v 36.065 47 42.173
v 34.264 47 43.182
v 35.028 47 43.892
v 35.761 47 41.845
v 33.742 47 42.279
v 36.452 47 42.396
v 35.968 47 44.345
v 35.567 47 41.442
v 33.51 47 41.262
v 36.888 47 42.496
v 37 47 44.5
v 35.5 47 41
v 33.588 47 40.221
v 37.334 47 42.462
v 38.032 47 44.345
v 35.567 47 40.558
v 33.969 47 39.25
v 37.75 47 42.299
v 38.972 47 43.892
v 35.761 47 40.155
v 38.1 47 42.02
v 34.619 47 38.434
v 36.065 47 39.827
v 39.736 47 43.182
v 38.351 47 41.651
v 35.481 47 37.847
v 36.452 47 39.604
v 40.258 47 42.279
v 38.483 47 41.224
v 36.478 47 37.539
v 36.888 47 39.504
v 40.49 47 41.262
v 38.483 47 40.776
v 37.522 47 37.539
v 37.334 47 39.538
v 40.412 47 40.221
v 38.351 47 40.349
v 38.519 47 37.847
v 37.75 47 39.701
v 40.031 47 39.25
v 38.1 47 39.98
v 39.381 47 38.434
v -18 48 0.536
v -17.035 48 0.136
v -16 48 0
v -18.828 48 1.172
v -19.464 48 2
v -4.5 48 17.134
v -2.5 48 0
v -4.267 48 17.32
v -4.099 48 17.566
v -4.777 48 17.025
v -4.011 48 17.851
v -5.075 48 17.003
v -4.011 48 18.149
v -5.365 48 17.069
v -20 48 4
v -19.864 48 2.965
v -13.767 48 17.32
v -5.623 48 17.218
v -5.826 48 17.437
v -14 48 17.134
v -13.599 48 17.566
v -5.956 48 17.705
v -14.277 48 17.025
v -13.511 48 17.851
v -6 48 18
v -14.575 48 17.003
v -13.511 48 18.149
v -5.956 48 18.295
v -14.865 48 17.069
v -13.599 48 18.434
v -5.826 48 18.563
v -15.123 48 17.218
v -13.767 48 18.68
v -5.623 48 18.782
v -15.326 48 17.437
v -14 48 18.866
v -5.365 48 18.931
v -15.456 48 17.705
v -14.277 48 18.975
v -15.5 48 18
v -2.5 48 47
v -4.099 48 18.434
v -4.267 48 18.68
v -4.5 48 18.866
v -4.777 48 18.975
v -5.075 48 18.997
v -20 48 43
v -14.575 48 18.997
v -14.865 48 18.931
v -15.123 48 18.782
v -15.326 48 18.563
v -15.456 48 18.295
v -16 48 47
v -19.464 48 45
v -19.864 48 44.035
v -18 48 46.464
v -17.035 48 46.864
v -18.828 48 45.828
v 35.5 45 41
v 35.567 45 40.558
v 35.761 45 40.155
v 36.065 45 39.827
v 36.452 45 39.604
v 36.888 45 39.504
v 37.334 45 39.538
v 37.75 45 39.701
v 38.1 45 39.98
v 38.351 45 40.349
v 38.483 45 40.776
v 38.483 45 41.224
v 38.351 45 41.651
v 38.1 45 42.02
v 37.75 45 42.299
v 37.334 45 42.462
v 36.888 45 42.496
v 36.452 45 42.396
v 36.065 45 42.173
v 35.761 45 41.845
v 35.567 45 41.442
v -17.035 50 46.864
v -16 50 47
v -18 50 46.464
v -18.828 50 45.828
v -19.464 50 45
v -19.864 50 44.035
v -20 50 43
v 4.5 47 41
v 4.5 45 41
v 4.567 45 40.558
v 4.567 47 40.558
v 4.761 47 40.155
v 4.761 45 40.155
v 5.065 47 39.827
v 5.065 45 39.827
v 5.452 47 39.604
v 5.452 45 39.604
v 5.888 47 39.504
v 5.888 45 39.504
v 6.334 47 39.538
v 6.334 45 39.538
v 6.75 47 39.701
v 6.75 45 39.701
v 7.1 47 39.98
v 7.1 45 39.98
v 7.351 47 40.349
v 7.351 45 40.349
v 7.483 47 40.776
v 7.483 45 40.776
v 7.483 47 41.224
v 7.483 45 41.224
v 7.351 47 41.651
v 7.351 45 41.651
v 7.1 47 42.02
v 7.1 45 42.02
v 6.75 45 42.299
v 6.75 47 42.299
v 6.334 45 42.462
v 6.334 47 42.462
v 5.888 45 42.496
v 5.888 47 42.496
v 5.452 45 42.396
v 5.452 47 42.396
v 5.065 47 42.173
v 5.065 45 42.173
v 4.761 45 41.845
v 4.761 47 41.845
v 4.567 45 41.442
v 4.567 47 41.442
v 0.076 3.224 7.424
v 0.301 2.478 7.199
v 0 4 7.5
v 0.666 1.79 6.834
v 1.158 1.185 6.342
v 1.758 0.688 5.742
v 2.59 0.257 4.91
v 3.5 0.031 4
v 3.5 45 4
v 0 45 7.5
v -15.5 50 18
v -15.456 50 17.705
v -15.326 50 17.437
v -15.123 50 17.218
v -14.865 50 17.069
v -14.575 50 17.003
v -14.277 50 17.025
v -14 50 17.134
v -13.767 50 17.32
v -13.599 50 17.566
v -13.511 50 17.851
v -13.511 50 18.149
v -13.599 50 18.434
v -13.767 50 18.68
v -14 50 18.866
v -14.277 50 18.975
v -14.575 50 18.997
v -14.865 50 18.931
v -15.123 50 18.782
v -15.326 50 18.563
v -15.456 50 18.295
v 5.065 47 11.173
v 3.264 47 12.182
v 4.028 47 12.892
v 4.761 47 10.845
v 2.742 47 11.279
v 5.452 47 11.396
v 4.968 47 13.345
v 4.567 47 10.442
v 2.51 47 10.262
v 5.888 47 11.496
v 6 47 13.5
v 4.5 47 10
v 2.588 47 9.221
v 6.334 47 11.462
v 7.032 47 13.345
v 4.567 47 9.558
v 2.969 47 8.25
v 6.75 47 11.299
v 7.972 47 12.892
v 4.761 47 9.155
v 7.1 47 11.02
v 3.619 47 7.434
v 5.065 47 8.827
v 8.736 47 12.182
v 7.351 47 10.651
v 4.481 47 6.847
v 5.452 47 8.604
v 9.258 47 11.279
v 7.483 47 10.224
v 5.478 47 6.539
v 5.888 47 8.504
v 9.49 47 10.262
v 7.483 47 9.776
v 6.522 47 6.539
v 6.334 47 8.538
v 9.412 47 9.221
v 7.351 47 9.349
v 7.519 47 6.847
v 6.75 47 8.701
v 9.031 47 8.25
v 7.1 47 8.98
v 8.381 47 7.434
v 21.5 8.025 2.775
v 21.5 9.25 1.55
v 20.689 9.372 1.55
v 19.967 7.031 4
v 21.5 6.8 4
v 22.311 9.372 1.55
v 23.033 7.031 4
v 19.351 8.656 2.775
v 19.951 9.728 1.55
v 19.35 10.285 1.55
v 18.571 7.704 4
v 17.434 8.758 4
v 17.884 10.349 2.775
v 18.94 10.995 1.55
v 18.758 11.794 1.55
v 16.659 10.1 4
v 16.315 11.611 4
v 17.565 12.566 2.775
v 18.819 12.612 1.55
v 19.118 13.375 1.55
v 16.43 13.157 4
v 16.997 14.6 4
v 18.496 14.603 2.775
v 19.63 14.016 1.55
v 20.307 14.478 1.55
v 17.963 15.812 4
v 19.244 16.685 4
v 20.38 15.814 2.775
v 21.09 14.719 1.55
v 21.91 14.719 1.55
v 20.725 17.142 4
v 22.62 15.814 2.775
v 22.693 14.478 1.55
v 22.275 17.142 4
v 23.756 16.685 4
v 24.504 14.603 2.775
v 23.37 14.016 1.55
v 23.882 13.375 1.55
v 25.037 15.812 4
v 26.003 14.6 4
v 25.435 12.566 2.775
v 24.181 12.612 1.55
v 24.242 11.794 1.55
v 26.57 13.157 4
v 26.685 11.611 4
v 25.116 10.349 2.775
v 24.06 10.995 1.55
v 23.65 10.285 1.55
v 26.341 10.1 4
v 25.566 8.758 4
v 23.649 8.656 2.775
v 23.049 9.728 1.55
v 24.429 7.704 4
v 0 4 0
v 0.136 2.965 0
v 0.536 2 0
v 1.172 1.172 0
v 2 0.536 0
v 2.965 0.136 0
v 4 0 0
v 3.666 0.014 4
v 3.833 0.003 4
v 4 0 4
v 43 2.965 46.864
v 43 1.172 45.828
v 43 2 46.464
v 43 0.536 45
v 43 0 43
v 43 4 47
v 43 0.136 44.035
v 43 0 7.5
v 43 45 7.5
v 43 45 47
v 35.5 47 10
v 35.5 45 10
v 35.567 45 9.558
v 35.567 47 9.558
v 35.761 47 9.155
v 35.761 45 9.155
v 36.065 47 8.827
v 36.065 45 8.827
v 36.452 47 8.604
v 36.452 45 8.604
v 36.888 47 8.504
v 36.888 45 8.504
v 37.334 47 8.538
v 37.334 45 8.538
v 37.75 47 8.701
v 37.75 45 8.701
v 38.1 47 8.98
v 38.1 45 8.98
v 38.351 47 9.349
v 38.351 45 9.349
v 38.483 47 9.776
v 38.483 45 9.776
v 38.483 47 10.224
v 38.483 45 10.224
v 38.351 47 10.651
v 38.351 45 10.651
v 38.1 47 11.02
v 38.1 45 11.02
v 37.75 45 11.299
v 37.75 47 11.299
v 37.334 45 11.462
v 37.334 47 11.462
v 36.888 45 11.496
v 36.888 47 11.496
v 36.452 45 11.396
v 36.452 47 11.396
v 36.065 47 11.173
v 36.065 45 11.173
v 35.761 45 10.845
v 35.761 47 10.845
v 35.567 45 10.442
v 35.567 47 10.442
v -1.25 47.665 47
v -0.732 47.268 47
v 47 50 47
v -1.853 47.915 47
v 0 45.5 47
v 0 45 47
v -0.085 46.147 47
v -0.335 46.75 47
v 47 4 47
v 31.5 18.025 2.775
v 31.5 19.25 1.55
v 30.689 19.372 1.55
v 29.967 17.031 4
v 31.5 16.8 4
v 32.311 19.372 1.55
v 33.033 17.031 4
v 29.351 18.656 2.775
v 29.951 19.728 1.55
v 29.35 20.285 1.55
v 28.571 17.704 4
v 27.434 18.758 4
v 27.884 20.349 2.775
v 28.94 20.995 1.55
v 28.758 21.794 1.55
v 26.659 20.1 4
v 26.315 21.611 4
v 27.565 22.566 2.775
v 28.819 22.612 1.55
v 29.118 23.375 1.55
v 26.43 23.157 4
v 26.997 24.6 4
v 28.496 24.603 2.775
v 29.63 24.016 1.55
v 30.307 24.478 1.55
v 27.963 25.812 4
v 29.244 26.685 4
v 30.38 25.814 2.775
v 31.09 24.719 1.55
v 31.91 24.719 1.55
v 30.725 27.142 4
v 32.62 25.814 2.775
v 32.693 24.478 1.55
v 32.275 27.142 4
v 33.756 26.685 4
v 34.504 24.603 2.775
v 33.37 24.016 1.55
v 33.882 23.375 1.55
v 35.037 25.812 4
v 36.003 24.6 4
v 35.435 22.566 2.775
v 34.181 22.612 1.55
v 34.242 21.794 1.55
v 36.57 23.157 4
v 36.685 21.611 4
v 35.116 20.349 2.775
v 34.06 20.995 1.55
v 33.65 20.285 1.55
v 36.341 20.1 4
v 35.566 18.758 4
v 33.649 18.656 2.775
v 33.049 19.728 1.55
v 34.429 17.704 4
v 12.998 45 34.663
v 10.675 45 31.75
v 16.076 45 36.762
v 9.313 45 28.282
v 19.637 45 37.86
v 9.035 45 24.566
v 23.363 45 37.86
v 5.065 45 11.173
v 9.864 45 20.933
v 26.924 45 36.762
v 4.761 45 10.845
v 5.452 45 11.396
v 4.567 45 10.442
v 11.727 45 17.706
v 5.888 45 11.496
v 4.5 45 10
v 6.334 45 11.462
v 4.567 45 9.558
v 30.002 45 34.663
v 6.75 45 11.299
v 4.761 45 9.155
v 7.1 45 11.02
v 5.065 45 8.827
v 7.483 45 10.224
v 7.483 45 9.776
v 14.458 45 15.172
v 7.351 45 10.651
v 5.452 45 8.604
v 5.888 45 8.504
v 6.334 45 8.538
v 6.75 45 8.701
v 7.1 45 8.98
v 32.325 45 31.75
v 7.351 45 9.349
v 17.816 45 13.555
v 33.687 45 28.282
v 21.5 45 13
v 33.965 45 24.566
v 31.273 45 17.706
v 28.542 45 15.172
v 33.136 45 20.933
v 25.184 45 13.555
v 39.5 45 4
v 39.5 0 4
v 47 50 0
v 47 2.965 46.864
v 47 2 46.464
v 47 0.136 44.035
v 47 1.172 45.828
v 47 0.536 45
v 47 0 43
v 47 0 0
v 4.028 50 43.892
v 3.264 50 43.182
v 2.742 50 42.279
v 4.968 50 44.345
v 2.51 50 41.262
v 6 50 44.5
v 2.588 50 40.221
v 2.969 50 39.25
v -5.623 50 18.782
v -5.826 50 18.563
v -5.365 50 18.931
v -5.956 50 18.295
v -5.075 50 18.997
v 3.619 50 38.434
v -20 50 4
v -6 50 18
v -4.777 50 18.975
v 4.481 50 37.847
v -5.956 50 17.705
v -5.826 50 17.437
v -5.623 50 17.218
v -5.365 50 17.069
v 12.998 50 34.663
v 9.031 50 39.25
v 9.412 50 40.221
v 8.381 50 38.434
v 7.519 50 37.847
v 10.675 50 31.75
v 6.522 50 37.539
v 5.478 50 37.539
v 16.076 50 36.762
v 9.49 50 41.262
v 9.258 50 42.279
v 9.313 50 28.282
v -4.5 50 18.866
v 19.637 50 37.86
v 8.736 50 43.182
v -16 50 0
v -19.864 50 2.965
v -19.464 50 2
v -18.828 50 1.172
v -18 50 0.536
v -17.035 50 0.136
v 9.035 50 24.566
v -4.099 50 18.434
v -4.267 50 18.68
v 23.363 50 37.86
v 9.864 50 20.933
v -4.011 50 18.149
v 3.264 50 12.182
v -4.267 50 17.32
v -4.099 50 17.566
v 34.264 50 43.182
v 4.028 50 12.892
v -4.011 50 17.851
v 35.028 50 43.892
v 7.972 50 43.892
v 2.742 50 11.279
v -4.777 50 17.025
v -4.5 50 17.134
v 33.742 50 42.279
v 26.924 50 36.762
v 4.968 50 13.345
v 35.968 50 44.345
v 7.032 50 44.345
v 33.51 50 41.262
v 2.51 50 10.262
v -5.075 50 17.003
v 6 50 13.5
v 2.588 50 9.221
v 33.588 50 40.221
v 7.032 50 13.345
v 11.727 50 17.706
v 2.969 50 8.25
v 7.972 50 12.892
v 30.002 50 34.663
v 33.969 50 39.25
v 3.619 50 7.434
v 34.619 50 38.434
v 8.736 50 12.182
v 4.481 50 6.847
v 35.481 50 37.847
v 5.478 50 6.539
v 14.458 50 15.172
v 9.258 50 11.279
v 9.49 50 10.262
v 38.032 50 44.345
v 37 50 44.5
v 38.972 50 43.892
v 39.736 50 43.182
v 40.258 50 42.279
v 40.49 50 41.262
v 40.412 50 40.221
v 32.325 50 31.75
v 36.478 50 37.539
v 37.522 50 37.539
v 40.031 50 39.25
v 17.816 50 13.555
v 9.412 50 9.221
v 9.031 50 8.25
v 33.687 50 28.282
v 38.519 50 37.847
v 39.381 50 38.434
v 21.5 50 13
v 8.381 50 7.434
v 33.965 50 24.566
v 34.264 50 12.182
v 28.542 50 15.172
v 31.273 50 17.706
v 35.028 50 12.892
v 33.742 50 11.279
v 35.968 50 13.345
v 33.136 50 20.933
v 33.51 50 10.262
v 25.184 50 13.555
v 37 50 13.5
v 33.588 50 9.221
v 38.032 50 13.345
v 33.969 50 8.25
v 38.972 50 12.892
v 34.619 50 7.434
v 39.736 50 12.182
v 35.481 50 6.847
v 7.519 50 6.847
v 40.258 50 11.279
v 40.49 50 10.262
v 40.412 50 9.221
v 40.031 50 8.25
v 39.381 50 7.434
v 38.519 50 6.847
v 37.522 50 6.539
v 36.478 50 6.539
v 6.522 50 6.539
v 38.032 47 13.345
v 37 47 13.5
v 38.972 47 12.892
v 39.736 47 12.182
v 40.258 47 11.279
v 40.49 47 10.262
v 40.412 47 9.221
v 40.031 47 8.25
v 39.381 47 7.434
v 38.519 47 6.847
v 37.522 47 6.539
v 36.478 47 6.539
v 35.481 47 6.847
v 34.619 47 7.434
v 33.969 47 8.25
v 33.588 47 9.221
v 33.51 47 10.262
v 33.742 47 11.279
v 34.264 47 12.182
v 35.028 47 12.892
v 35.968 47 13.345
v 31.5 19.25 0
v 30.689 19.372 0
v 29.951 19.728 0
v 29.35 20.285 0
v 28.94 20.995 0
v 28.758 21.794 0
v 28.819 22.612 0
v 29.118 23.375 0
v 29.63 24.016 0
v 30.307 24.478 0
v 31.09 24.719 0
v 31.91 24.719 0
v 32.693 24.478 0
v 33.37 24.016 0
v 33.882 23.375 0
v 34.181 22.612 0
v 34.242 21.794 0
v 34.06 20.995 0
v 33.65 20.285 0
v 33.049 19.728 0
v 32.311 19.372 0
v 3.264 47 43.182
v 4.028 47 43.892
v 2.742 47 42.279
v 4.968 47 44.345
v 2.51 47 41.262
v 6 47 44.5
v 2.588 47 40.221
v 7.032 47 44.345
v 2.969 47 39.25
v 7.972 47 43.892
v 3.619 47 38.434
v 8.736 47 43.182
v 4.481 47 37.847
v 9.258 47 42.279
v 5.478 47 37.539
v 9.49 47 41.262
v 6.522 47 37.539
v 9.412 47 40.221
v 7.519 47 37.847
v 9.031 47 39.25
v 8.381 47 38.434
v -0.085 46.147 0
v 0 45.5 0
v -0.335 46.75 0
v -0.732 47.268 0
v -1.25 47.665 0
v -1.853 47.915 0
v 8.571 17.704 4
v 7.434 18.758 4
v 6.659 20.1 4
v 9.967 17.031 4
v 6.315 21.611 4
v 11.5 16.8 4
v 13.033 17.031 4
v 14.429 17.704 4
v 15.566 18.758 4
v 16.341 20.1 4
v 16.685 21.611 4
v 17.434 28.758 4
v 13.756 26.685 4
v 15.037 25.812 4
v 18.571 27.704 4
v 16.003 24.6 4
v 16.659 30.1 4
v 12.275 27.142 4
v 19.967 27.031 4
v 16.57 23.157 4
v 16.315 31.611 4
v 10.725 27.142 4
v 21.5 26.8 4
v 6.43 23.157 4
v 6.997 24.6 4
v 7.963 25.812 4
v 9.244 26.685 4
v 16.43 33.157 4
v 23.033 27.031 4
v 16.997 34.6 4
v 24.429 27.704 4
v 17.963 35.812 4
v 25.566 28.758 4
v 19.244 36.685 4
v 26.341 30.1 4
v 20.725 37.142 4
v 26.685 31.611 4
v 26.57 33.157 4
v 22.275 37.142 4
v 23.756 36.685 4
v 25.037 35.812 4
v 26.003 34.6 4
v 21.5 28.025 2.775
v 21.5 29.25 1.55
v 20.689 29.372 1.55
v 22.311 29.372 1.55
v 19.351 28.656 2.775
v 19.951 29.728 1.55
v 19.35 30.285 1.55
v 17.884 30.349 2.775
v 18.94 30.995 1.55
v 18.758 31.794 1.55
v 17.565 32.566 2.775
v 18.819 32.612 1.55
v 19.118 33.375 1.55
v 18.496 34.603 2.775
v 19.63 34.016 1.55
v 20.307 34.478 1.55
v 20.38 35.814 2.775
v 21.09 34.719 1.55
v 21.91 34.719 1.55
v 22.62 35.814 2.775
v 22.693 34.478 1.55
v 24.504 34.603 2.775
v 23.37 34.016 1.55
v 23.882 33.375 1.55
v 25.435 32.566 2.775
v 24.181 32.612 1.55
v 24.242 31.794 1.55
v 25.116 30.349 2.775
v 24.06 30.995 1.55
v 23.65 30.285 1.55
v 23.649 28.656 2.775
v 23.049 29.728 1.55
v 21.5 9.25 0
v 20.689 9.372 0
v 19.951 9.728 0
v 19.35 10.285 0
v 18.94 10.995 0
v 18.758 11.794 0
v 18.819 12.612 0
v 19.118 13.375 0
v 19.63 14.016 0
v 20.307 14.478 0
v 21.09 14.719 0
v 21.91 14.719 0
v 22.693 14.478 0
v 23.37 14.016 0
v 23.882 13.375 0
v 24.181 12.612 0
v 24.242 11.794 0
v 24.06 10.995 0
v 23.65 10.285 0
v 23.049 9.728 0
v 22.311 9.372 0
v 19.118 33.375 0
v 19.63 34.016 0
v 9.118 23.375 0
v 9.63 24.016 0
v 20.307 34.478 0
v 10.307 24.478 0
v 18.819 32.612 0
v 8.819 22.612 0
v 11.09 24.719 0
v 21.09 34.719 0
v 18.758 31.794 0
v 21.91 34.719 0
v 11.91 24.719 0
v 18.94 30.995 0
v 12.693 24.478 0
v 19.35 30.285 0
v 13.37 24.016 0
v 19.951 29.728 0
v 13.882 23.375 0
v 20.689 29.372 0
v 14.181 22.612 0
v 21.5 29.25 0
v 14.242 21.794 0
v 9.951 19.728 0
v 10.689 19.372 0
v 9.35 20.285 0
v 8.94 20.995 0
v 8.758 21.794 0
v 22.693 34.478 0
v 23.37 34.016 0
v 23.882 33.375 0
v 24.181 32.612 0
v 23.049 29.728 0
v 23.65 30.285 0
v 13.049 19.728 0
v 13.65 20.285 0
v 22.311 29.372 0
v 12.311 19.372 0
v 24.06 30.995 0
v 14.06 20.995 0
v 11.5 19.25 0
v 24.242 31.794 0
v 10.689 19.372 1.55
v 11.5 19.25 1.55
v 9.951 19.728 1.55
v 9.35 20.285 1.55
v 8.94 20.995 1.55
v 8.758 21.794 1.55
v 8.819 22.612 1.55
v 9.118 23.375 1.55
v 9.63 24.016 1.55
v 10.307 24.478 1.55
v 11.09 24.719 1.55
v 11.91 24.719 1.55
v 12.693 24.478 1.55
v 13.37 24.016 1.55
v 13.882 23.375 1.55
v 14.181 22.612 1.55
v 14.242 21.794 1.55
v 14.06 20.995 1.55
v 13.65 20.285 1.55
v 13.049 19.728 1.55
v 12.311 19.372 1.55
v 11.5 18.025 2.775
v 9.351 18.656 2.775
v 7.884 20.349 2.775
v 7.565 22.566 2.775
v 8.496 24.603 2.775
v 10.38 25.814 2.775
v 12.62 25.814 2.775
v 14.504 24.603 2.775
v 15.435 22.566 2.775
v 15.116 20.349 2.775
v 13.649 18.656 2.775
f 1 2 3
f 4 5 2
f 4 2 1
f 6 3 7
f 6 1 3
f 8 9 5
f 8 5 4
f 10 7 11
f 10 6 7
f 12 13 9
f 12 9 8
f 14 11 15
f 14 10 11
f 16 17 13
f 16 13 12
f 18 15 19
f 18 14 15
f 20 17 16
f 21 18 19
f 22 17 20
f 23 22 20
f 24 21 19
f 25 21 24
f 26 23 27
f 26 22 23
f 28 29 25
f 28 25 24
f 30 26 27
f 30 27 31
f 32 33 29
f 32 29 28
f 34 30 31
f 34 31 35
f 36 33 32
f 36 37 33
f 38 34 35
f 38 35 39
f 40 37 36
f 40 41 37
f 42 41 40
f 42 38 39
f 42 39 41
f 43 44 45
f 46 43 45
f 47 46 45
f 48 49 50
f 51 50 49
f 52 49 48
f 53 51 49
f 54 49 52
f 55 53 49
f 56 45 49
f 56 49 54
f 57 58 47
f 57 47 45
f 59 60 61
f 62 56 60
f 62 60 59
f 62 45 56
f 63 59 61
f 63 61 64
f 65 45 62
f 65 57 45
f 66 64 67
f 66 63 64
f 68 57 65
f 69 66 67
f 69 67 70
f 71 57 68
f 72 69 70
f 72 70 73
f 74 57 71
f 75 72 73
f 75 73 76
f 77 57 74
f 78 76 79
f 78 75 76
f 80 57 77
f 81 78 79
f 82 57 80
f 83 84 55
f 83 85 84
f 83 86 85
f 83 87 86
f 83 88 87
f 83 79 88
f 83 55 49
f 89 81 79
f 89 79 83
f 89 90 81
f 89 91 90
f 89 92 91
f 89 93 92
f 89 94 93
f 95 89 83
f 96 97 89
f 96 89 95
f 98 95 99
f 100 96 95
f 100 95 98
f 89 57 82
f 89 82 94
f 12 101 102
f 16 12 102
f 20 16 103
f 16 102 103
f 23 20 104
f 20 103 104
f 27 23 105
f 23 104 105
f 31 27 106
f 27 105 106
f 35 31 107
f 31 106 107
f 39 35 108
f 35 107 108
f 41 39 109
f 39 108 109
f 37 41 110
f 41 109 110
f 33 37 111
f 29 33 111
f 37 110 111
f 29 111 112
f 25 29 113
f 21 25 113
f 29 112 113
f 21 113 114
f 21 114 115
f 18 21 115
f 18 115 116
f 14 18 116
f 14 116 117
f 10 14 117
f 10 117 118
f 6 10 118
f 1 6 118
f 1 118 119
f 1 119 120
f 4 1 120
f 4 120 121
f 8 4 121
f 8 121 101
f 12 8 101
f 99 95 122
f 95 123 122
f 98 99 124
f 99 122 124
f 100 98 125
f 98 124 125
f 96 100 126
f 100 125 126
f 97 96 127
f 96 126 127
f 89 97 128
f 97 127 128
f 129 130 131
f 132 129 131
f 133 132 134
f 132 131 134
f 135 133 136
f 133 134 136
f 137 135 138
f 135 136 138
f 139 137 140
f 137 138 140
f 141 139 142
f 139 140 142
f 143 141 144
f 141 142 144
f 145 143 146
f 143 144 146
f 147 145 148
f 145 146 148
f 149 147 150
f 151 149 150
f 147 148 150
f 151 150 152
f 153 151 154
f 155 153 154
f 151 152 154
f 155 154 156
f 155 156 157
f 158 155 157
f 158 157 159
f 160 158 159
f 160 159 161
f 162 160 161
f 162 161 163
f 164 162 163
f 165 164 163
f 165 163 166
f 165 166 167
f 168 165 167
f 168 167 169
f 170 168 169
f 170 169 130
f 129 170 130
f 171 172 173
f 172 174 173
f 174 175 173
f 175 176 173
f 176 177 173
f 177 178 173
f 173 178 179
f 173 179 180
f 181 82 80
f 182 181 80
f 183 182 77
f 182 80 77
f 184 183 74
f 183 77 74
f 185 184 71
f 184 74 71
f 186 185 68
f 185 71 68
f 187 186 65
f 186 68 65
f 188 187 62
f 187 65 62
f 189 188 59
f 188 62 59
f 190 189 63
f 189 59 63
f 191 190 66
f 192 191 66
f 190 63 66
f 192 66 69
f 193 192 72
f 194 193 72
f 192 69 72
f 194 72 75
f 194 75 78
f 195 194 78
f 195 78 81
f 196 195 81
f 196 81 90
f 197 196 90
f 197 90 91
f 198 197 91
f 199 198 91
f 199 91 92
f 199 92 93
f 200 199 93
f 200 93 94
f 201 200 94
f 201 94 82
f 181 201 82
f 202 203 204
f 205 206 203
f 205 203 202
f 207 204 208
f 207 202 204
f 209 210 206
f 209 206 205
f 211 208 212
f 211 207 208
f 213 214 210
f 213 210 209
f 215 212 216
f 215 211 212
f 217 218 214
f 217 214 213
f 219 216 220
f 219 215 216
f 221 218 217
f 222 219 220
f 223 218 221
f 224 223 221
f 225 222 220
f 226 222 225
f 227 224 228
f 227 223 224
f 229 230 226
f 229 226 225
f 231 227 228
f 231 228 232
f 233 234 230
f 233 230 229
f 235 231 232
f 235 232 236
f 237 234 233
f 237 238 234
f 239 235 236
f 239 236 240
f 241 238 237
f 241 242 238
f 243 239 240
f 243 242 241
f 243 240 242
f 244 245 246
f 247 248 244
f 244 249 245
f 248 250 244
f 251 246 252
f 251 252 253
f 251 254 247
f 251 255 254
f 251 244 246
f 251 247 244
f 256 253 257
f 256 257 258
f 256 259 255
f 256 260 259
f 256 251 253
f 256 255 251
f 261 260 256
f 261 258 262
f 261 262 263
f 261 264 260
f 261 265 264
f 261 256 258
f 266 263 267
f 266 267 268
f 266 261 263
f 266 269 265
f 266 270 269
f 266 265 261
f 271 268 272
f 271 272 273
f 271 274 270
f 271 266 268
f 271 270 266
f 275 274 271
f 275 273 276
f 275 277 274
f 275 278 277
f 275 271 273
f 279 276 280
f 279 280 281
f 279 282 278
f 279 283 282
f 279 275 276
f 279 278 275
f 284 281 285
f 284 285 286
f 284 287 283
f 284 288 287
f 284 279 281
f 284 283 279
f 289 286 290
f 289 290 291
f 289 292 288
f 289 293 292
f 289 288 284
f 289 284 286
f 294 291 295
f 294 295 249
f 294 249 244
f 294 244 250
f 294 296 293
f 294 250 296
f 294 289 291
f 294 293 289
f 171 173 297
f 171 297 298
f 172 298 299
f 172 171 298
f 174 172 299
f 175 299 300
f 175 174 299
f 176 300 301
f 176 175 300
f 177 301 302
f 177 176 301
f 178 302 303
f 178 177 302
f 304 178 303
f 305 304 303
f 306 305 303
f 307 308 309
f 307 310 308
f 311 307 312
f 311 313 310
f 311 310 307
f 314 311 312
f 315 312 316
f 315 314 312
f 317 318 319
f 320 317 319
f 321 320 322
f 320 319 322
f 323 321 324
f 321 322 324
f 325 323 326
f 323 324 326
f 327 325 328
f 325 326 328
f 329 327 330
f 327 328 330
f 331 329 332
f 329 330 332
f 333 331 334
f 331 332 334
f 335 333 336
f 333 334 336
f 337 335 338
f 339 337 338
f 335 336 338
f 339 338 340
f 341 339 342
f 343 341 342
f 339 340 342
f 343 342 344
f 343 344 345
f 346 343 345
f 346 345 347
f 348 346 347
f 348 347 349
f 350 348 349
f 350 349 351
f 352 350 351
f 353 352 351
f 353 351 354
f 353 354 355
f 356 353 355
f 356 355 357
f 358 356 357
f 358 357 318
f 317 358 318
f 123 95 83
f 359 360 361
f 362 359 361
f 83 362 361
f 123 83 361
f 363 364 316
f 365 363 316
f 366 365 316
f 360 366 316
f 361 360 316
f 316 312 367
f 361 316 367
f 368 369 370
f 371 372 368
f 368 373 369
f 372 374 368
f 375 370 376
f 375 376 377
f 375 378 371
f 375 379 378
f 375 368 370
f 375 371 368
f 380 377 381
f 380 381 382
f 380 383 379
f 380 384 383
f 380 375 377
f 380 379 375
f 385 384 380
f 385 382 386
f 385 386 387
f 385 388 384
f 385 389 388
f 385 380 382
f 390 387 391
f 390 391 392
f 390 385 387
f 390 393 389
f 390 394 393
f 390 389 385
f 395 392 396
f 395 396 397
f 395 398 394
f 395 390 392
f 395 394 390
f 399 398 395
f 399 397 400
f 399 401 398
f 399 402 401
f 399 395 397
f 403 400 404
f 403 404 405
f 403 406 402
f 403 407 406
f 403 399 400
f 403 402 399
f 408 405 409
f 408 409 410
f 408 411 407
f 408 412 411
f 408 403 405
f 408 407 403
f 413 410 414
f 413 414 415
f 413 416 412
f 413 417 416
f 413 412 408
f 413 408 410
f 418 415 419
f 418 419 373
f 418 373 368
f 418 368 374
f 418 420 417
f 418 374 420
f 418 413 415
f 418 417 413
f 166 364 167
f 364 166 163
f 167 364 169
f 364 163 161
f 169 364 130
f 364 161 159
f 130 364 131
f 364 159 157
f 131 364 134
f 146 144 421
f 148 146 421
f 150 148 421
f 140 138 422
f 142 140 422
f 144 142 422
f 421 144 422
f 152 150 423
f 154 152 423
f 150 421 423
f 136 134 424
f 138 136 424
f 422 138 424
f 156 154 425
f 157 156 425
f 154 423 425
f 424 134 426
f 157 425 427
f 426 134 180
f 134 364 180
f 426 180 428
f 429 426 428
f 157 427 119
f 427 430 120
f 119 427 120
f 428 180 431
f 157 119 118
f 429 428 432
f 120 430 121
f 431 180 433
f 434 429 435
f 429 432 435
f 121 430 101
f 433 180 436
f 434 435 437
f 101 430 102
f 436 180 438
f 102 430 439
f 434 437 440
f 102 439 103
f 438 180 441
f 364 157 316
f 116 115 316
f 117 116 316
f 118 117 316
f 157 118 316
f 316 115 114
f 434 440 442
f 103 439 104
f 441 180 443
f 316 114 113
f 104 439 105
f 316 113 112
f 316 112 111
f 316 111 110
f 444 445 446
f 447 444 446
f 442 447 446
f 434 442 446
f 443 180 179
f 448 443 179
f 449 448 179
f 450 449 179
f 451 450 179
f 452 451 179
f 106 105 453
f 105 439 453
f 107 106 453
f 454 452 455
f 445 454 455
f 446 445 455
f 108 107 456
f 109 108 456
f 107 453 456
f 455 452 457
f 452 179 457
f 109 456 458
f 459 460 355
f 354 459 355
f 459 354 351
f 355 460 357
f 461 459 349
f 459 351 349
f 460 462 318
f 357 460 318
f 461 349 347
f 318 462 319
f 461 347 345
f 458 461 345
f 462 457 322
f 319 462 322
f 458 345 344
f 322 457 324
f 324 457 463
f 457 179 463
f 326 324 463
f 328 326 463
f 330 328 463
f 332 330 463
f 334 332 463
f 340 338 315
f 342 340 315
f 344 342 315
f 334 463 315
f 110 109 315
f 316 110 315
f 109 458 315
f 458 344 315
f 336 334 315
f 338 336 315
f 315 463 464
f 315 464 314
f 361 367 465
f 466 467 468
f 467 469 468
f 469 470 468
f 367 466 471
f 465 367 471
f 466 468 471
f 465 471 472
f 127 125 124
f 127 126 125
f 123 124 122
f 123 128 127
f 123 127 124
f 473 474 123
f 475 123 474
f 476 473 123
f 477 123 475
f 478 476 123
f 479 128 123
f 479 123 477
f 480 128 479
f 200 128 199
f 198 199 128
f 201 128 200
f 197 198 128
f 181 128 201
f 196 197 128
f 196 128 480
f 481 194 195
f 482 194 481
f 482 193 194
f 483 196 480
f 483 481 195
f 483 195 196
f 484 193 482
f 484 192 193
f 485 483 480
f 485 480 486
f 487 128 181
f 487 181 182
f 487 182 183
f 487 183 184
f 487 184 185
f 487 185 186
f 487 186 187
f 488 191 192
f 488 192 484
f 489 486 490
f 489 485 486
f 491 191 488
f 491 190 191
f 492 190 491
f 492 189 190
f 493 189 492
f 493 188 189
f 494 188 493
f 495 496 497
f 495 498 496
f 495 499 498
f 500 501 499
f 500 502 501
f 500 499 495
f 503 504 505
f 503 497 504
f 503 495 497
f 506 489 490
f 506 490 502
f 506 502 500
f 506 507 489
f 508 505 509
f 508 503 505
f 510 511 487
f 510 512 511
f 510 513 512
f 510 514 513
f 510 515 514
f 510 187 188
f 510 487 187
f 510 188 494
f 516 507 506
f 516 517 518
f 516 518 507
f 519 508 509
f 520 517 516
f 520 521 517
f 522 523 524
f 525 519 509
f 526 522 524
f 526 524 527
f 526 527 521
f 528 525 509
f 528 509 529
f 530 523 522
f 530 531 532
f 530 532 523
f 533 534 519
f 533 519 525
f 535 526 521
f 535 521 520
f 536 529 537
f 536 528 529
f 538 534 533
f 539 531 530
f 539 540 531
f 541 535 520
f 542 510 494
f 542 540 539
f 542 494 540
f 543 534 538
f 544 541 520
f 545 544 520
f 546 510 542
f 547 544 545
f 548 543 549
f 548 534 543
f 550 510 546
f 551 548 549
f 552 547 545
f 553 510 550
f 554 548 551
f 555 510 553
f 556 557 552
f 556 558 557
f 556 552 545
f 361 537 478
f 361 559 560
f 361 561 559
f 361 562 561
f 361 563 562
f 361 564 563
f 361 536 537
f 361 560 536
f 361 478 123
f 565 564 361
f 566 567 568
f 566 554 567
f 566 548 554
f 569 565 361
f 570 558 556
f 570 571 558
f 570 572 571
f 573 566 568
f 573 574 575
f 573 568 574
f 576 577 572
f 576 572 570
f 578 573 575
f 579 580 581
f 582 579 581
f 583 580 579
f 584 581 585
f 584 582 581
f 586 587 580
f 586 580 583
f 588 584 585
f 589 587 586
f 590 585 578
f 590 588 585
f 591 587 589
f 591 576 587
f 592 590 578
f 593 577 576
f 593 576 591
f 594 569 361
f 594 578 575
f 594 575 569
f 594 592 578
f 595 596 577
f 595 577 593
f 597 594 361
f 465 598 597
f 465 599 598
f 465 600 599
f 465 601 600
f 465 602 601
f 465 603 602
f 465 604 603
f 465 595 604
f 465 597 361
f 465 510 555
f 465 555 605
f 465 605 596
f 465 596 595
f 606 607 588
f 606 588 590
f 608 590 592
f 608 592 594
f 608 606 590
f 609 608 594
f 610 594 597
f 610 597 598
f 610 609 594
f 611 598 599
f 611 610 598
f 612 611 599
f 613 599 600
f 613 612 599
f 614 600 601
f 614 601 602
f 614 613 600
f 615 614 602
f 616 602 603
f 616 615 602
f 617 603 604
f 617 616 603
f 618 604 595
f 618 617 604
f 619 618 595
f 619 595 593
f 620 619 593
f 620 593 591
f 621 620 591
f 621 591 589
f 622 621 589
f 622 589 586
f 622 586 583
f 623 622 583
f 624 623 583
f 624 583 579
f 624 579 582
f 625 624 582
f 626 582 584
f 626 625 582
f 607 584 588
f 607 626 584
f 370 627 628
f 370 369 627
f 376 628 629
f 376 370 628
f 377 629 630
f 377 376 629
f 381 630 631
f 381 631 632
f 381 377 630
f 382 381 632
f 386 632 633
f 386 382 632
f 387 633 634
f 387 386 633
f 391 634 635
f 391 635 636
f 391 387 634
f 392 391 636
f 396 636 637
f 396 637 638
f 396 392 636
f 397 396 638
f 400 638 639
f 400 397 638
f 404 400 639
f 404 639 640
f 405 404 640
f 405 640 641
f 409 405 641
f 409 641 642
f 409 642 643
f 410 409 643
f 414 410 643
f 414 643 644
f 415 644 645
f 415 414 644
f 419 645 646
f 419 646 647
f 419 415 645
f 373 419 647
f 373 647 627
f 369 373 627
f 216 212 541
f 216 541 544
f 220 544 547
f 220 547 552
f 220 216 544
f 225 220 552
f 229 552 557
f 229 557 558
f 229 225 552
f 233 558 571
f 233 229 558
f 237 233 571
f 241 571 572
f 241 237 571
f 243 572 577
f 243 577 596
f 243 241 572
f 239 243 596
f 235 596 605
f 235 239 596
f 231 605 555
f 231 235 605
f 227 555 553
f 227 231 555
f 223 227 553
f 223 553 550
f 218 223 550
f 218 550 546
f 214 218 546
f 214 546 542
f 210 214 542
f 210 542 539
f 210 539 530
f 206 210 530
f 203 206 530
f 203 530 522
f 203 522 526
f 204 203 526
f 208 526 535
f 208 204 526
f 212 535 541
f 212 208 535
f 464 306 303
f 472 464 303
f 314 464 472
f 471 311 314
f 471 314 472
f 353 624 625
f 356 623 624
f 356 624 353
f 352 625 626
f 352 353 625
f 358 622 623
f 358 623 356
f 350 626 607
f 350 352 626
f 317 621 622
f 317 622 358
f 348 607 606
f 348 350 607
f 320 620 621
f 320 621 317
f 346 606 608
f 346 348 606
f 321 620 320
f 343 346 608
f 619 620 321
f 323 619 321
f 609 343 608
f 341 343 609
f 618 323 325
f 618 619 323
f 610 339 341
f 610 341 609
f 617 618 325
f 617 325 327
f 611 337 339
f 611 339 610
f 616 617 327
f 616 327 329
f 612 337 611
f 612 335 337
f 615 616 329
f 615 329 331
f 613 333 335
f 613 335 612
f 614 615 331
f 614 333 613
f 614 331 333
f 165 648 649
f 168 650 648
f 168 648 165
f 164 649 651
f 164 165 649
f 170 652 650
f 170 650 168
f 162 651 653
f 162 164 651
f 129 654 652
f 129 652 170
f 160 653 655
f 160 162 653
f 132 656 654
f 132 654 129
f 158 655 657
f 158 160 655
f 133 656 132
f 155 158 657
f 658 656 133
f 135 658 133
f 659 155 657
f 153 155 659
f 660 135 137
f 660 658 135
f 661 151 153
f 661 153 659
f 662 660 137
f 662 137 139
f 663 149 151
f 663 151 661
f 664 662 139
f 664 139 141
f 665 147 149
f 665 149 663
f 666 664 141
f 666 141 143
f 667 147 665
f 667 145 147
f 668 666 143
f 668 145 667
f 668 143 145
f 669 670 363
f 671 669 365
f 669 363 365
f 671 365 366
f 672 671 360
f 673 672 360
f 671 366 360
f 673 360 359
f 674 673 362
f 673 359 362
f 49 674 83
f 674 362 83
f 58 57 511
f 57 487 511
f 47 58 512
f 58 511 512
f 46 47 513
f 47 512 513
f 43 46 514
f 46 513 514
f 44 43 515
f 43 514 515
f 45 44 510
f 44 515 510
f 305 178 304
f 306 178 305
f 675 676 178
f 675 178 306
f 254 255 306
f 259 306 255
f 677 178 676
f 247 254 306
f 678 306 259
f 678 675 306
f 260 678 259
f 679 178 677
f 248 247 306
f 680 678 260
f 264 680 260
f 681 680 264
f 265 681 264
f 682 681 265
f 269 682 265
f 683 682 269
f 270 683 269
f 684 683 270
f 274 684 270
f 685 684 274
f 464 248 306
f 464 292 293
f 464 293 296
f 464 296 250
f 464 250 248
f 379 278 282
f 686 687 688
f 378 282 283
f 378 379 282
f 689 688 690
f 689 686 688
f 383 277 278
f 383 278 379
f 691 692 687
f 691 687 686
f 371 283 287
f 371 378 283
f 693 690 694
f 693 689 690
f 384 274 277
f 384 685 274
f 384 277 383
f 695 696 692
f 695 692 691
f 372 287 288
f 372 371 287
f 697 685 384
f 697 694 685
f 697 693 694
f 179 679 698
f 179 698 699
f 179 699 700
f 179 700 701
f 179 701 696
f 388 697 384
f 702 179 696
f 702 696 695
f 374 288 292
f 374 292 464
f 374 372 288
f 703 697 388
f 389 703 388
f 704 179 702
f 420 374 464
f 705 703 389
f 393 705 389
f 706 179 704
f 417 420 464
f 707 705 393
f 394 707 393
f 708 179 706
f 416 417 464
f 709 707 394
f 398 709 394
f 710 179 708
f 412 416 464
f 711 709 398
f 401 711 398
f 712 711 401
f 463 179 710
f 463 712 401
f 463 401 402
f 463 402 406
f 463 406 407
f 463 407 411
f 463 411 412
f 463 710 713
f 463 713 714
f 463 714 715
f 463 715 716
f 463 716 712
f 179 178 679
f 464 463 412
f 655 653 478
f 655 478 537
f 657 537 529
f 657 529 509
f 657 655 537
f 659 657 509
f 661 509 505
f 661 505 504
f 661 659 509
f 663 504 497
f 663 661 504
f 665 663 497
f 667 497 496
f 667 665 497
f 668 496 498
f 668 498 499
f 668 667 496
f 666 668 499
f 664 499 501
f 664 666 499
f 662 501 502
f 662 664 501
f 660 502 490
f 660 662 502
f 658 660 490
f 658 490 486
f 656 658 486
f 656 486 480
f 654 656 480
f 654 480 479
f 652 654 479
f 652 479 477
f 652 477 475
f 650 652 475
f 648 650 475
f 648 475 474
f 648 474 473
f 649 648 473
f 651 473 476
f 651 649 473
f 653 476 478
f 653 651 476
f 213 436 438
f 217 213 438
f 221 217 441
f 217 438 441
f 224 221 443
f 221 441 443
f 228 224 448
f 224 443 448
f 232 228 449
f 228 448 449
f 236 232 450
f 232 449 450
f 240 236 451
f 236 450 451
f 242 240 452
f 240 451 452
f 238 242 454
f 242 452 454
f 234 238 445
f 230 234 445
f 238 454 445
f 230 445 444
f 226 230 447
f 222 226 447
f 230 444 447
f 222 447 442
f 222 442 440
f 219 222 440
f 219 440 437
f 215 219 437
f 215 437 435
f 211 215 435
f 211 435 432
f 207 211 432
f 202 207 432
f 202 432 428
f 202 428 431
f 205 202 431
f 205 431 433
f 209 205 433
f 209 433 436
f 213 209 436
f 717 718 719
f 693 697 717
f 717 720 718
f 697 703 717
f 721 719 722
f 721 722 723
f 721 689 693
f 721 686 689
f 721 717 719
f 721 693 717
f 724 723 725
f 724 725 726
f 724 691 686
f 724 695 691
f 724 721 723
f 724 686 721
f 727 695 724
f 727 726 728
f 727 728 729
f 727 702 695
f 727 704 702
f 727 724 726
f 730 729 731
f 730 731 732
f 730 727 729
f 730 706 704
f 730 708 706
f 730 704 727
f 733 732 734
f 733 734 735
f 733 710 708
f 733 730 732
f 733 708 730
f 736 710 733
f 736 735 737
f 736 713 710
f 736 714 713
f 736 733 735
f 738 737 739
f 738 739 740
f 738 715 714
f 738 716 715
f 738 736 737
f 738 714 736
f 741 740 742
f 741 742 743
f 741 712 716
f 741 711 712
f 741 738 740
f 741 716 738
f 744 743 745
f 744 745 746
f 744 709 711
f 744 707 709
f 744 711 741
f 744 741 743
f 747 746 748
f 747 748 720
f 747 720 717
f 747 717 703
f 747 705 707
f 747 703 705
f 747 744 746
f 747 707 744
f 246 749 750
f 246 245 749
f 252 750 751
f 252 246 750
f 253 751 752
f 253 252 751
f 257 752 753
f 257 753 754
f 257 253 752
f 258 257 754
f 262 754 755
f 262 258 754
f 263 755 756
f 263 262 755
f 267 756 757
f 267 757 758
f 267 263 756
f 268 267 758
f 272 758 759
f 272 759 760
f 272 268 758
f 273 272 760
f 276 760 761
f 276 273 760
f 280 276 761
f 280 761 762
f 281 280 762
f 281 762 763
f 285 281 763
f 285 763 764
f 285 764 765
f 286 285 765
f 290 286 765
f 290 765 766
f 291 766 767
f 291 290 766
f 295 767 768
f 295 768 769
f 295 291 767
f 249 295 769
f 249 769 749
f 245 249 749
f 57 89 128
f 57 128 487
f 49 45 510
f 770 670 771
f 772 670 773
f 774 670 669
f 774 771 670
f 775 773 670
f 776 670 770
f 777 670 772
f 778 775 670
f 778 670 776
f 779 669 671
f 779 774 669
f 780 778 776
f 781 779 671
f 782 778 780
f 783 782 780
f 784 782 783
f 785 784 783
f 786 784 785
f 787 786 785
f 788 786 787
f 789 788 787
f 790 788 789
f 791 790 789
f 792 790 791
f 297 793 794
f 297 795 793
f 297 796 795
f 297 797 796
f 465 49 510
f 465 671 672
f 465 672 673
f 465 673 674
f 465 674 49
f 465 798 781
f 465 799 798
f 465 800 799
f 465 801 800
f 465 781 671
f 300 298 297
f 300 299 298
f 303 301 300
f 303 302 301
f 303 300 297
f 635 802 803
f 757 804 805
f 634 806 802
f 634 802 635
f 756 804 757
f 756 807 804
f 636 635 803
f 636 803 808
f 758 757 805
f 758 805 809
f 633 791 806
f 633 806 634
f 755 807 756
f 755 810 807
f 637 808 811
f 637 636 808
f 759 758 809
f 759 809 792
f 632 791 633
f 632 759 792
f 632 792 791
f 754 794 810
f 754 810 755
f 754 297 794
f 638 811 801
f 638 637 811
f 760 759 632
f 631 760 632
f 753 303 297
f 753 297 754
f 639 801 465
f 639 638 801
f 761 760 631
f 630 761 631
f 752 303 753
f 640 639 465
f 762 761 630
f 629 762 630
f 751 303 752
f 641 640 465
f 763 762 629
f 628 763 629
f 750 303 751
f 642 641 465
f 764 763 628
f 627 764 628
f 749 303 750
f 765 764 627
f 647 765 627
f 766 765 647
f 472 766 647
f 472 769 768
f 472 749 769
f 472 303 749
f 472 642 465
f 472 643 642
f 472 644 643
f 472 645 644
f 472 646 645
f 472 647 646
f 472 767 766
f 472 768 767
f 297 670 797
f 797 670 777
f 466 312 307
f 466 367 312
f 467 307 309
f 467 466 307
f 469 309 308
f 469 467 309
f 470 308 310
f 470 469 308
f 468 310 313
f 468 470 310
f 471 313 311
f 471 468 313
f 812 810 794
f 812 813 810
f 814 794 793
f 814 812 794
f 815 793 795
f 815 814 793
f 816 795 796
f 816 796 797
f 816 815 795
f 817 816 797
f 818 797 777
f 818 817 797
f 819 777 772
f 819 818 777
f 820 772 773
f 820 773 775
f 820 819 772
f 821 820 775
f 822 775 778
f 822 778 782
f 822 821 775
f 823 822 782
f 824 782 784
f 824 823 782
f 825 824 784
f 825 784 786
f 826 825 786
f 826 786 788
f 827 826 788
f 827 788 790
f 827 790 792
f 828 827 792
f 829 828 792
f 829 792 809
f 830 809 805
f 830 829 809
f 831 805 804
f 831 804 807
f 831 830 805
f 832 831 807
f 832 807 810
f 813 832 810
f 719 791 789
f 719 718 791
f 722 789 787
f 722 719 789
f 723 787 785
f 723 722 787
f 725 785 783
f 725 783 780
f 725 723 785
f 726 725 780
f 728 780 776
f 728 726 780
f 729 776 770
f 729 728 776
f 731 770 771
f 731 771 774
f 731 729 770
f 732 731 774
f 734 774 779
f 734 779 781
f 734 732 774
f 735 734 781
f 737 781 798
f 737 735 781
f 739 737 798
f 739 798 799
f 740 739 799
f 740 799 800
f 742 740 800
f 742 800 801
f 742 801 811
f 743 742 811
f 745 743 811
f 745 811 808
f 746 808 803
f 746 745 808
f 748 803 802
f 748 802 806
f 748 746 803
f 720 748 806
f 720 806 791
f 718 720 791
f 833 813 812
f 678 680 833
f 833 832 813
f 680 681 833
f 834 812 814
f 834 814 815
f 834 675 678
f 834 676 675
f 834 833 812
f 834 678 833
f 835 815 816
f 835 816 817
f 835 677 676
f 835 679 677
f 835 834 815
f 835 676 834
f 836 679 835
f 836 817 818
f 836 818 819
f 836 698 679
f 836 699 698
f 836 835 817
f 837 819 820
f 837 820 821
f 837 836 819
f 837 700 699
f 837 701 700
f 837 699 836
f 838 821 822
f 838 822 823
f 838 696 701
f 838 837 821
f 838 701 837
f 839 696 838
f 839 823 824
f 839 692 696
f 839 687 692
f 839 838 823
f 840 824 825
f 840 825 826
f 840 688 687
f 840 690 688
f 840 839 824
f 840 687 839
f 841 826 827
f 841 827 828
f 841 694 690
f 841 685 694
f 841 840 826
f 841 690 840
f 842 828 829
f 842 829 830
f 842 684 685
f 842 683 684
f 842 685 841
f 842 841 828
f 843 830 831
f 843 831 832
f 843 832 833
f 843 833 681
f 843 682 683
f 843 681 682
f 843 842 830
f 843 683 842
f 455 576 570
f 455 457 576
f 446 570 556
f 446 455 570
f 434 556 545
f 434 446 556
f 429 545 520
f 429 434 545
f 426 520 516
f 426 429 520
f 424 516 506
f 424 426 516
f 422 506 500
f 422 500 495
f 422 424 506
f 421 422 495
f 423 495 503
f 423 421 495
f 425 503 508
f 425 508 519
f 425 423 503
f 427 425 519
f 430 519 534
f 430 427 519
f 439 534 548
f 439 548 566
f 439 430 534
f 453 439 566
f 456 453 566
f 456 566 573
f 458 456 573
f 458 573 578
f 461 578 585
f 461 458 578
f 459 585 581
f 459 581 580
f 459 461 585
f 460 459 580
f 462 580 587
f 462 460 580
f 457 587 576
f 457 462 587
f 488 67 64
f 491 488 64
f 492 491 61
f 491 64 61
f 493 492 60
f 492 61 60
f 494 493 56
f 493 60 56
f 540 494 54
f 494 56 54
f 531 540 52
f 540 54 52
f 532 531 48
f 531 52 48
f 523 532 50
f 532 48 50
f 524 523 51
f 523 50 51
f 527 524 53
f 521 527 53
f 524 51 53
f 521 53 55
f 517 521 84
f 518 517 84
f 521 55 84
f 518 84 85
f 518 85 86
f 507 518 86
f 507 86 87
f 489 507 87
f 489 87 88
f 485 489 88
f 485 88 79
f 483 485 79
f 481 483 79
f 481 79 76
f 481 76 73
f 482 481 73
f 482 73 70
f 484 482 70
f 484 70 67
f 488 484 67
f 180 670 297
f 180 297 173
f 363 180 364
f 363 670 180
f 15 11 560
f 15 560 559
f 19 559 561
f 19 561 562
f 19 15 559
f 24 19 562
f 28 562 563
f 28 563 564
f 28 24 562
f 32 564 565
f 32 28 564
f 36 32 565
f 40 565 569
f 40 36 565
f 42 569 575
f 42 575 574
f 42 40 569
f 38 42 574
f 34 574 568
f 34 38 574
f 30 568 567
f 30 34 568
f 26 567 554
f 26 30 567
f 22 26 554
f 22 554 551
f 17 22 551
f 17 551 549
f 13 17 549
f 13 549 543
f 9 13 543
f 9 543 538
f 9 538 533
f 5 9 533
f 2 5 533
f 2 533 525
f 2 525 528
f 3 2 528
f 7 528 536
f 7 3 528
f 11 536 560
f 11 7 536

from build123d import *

# Parameters (mm, degrees)
SKETCH_2_W                  = 47
SKETCH_2_H                  = 47
EXTRUDE_1_DEPTH             = 4
SKETCH_3_W                  = 47
SKETCH_3_H                  = 2
EXTRUDE_2_DEPTH             = 43
SKETCH_4_W                  = 4
SKETCH_4_H                  = 45
EXTRUDE_3_DEPTH             = 43
SKETCH_5_R                  = 12.5
CUT_EXTRUDE_1_DEPTH         = 81.268300094
M3X0_5_2_D                  = 3
HOLE_WIZARD_M5_1_AT_2_COUNT = 2
HOLE_WIZARD_M5_1_AT_2_PITCH = 14.142135624
HOLE_WIZARD_M5_1_AT_3_COUNT = 2
HOLE_WIZARD_M5_1_AT_3_PITCH = 20
HOLE_WIZARD_M5_1_AT_4_COUNT = 2
HOLE_WIZARD_M5_1_AT_4_PITCH = 14.142135624
EXTRUDE_6_DEPTH             = 45
EXTRUDE_7_DEPTH             = 45
SKETCH_23_W                 = 67
SKETCH_23_H                 = 47
SKETCH_23_R                 = 3.5
SKETCH_23_R_2               = 12.5
EXTRUDE_10_DEPTH            = 3
M2X0_4_1_D                  = 2
SKETCH_27_W                 = 47
SKETCH_27_H                 = 1
CUT_EXTRUDE_2_DEPTH         = 20
FILLET_1_R                  = 2.5
FILLET_2_R                  = 4


with BuildPart() as part:
    # ｽｹｯﾁ2 → ﾎﾞｽ - 押し出し1 (new body)
    with BuildSketch(Plane.XY):
        with Locations((23.5, 23.5)):
            Rectangle(SKETCH_2_W, SKETCH_2_H)
    extrude(amount=EXTRUDE_1_DEPTH)

    # ｽｹｯﾁ3 → ﾎﾞｽ - 押し出し2 (add)
    with BuildSketch(Plane.XY.offset(4)):
        with Locations((23.5, 46)):
            Rectangle(SKETCH_3_W, SKETCH_3_H)
    extrude(amount=EXTRUDE_2_DEPTH)

    # ｽｹｯﾁ4 → ﾎﾞｽ - 押し出し3 (add)
    with BuildSketch(Plane.XY.offset(4)):
        with Locations((45, 22.5)):
            Rectangle(SKETCH_4_W, SKETCH_4_H)
    extrude(amount=EXTRUDE_3_DEPTH)

    # ｽｹｯﾁ5 → ｶｯﾄ - 押し出し1 (cut, through all)
    with BuildSketch(Plane.XZ.offset(-45)):
        with Locations(Location((21.5, 25.5, 0), (0, 0, 270))):
            Circle(SKETCH_5_R)
    extrude(amount=-CUT_EXTRUDE_1_DEPTH, mode=Mode.SUBTRACT)

    # M3x0.5 ねじ穴2 (through all)
    with Locations(Plane(origin=(0, 47, 0), x_dir=(1, 0, 0), z_dir=(0, 1, 0))):
        with Locations((6, -10), (37, -10), (37, -41), (6, -41)):
            Hole(M3X0_5_2_D / 2)

    # ｽｹｯﾁ14 → M5 平皿頭ねじ用皿穴1 (revolve, cut)
    with BuildSketch(Plane(origin=(11.5, 22, 4), x_dir=(0, -1, 0), z_dir=(1, 0, 0))):
        Polygon((0, 0), (0, 4), (2.75, 4), (2.75, 2.45), (5.2, 0), align=None)
    hole_wizard_m5_1 = revolve(axis=Axis((11.5, 22, 10.35), (0, 0, -1)), mode=Mode.SUBTRACT)

    # M5 平皿頭ねじ用皿穴1 at 2: M5 平皿頭ねじ用皿穴1 ×2
    with Locations(*[Vector(0.7071067811865475, 0.7071067811865476, 0) * (i * HOLE_WIZARD_M5_1_AT_2_PITCH) for i in range(1, HOLE_WIZARD_M5_1_AT_2_COUNT)]):
        add(hole_wizard_m5_1, mode=Mode.SUBTRACT)

    # M5 平皿頭ねじ用皿穴1 at 3: M5 平皿頭ねじ用皿穴1 ×2
    with Locations(*[(i * HOLE_WIZARD_M5_1_AT_3_PITCH, 0, 0) for i in range(1, HOLE_WIZARD_M5_1_AT_3_COUNT)]):
        add(hole_wizard_m5_1, mode=Mode.SUBTRACT)

    # M5 平皿頭ねじ用皿穴1 at 4: M5 平皿頭ねじ用皿穴1 ×2
    with Locations(*[Vector(0.7071067811865474, -0.7071067811865478, 0) * (i * HOLE_WIZARD_M5_1_AT_4_PITCH) for i in range(1, HOLE_WIZARD_M5_1_AT_4_COUNT)]):
        add(hole_wizard_m5_1, mode=Mode.SUBTRACT)

    # ｽｹｯﾁ17 → ﾎﾞｽ - 押し出し6 (add)
    with BuildSketch(Plane.XZ.offset(-45)):
        Polygon((43, 4), (39.5, 4), (43, 7.5), align=None)
    extrude(amount=EXTRUDE_6_DEPTH)

    # ｽｹｯﾁ19 → ﾎﾞｽ - 押し出し7 (add)
    with BuildSketch(Plane.XZ.offset(-45)):
        Polygon((0, 4), (3.5, 4), (0, 7.5), align=None)
    extrude(amount=EXTRUDE_7_DEPTH)

    # ｽｹｯﾁ23 → ﾎﾞｽ - 押し出し10 (add)
    with BuildSketch(Plane(origin=(0, 47, 0), x_dir=(1, 0, 0), z_dir=(0, 1, 0))):
        with Locations((13.5, -23.5)):
            Rectangle(SKETCH_23_W, SKETCH_23_H)
        with Locations(Location((6, -10, 0), (0, 0, 270))):
            Circle(SKETCH_23_R, mode=Mode.SUBTRACT)
        with Locations(Location((6, -41, 0), (0, 0, 270))):
            Circle(SKETCH_23_R, mode=Mode.SUBTRACT)
        with Locations(Location((37, -10, 0), (0, 0, 270))):
            Circle(SKETCH_23_R, mode=Mode.SUBTRACT)
        with Locations(Location((37, -41, 0), (0, 0, 270))):
            Circle(SKETCH_23_R, mode=Mode.SUBTRACT)
        with Locations(Location((21.5, -25.5, 0), (0, 0, 90))):
            Circle(SKETCH_23_R_2, mode=Mode.SUBTRACT)
    extrude(amount=EXTRUDE_10_DEPTH)

    # M2x0.4 ねじ穴1 (through all)
    with Locations(Plane(origin=(0, 50, 0), x_dir=(1, 0, 0), z_dir=(0, 1, 0))):
        with Locations((-5, -18), (-14.5, -18)):
            Hole(M2X0_4_1_D / 2)

    # ｽｹｯﾁ27 → ｶｯﾄ - 押し出し2 (cut)
    with BuildSketch(Plane.ZY.offset(20)):
        with Locations((23.5, 47.5)):
            Rectangle(SKETCH_27_W, SKETCH_27_H)
    extrude(amount=-CUT_EXTRUDE_2_DEPTH, mode=Mode.SUBTRACT)

    # ﾌｨﾚｯﾄ1
    fillet_1_edges = [part.edges().sort_by_distance(p)[0] for p in [
        (0, 48, 23.5),
    ]]
    fillet(fillet_1_edges, radius=FILLET_1_R)

    # ﾌｨﾚｯﾄ2
    fillet_2_edges = [part.edges().sort_by_distance(p)[0] for p in [
        (-20, 49, 47),
        (-20, 49, 0),
        (0, 0, 3.75),
        (45, 0, 47),
    ]]
    fillet(fillet_2_edges, radius=FILLET_2_R)


solid = part.part
